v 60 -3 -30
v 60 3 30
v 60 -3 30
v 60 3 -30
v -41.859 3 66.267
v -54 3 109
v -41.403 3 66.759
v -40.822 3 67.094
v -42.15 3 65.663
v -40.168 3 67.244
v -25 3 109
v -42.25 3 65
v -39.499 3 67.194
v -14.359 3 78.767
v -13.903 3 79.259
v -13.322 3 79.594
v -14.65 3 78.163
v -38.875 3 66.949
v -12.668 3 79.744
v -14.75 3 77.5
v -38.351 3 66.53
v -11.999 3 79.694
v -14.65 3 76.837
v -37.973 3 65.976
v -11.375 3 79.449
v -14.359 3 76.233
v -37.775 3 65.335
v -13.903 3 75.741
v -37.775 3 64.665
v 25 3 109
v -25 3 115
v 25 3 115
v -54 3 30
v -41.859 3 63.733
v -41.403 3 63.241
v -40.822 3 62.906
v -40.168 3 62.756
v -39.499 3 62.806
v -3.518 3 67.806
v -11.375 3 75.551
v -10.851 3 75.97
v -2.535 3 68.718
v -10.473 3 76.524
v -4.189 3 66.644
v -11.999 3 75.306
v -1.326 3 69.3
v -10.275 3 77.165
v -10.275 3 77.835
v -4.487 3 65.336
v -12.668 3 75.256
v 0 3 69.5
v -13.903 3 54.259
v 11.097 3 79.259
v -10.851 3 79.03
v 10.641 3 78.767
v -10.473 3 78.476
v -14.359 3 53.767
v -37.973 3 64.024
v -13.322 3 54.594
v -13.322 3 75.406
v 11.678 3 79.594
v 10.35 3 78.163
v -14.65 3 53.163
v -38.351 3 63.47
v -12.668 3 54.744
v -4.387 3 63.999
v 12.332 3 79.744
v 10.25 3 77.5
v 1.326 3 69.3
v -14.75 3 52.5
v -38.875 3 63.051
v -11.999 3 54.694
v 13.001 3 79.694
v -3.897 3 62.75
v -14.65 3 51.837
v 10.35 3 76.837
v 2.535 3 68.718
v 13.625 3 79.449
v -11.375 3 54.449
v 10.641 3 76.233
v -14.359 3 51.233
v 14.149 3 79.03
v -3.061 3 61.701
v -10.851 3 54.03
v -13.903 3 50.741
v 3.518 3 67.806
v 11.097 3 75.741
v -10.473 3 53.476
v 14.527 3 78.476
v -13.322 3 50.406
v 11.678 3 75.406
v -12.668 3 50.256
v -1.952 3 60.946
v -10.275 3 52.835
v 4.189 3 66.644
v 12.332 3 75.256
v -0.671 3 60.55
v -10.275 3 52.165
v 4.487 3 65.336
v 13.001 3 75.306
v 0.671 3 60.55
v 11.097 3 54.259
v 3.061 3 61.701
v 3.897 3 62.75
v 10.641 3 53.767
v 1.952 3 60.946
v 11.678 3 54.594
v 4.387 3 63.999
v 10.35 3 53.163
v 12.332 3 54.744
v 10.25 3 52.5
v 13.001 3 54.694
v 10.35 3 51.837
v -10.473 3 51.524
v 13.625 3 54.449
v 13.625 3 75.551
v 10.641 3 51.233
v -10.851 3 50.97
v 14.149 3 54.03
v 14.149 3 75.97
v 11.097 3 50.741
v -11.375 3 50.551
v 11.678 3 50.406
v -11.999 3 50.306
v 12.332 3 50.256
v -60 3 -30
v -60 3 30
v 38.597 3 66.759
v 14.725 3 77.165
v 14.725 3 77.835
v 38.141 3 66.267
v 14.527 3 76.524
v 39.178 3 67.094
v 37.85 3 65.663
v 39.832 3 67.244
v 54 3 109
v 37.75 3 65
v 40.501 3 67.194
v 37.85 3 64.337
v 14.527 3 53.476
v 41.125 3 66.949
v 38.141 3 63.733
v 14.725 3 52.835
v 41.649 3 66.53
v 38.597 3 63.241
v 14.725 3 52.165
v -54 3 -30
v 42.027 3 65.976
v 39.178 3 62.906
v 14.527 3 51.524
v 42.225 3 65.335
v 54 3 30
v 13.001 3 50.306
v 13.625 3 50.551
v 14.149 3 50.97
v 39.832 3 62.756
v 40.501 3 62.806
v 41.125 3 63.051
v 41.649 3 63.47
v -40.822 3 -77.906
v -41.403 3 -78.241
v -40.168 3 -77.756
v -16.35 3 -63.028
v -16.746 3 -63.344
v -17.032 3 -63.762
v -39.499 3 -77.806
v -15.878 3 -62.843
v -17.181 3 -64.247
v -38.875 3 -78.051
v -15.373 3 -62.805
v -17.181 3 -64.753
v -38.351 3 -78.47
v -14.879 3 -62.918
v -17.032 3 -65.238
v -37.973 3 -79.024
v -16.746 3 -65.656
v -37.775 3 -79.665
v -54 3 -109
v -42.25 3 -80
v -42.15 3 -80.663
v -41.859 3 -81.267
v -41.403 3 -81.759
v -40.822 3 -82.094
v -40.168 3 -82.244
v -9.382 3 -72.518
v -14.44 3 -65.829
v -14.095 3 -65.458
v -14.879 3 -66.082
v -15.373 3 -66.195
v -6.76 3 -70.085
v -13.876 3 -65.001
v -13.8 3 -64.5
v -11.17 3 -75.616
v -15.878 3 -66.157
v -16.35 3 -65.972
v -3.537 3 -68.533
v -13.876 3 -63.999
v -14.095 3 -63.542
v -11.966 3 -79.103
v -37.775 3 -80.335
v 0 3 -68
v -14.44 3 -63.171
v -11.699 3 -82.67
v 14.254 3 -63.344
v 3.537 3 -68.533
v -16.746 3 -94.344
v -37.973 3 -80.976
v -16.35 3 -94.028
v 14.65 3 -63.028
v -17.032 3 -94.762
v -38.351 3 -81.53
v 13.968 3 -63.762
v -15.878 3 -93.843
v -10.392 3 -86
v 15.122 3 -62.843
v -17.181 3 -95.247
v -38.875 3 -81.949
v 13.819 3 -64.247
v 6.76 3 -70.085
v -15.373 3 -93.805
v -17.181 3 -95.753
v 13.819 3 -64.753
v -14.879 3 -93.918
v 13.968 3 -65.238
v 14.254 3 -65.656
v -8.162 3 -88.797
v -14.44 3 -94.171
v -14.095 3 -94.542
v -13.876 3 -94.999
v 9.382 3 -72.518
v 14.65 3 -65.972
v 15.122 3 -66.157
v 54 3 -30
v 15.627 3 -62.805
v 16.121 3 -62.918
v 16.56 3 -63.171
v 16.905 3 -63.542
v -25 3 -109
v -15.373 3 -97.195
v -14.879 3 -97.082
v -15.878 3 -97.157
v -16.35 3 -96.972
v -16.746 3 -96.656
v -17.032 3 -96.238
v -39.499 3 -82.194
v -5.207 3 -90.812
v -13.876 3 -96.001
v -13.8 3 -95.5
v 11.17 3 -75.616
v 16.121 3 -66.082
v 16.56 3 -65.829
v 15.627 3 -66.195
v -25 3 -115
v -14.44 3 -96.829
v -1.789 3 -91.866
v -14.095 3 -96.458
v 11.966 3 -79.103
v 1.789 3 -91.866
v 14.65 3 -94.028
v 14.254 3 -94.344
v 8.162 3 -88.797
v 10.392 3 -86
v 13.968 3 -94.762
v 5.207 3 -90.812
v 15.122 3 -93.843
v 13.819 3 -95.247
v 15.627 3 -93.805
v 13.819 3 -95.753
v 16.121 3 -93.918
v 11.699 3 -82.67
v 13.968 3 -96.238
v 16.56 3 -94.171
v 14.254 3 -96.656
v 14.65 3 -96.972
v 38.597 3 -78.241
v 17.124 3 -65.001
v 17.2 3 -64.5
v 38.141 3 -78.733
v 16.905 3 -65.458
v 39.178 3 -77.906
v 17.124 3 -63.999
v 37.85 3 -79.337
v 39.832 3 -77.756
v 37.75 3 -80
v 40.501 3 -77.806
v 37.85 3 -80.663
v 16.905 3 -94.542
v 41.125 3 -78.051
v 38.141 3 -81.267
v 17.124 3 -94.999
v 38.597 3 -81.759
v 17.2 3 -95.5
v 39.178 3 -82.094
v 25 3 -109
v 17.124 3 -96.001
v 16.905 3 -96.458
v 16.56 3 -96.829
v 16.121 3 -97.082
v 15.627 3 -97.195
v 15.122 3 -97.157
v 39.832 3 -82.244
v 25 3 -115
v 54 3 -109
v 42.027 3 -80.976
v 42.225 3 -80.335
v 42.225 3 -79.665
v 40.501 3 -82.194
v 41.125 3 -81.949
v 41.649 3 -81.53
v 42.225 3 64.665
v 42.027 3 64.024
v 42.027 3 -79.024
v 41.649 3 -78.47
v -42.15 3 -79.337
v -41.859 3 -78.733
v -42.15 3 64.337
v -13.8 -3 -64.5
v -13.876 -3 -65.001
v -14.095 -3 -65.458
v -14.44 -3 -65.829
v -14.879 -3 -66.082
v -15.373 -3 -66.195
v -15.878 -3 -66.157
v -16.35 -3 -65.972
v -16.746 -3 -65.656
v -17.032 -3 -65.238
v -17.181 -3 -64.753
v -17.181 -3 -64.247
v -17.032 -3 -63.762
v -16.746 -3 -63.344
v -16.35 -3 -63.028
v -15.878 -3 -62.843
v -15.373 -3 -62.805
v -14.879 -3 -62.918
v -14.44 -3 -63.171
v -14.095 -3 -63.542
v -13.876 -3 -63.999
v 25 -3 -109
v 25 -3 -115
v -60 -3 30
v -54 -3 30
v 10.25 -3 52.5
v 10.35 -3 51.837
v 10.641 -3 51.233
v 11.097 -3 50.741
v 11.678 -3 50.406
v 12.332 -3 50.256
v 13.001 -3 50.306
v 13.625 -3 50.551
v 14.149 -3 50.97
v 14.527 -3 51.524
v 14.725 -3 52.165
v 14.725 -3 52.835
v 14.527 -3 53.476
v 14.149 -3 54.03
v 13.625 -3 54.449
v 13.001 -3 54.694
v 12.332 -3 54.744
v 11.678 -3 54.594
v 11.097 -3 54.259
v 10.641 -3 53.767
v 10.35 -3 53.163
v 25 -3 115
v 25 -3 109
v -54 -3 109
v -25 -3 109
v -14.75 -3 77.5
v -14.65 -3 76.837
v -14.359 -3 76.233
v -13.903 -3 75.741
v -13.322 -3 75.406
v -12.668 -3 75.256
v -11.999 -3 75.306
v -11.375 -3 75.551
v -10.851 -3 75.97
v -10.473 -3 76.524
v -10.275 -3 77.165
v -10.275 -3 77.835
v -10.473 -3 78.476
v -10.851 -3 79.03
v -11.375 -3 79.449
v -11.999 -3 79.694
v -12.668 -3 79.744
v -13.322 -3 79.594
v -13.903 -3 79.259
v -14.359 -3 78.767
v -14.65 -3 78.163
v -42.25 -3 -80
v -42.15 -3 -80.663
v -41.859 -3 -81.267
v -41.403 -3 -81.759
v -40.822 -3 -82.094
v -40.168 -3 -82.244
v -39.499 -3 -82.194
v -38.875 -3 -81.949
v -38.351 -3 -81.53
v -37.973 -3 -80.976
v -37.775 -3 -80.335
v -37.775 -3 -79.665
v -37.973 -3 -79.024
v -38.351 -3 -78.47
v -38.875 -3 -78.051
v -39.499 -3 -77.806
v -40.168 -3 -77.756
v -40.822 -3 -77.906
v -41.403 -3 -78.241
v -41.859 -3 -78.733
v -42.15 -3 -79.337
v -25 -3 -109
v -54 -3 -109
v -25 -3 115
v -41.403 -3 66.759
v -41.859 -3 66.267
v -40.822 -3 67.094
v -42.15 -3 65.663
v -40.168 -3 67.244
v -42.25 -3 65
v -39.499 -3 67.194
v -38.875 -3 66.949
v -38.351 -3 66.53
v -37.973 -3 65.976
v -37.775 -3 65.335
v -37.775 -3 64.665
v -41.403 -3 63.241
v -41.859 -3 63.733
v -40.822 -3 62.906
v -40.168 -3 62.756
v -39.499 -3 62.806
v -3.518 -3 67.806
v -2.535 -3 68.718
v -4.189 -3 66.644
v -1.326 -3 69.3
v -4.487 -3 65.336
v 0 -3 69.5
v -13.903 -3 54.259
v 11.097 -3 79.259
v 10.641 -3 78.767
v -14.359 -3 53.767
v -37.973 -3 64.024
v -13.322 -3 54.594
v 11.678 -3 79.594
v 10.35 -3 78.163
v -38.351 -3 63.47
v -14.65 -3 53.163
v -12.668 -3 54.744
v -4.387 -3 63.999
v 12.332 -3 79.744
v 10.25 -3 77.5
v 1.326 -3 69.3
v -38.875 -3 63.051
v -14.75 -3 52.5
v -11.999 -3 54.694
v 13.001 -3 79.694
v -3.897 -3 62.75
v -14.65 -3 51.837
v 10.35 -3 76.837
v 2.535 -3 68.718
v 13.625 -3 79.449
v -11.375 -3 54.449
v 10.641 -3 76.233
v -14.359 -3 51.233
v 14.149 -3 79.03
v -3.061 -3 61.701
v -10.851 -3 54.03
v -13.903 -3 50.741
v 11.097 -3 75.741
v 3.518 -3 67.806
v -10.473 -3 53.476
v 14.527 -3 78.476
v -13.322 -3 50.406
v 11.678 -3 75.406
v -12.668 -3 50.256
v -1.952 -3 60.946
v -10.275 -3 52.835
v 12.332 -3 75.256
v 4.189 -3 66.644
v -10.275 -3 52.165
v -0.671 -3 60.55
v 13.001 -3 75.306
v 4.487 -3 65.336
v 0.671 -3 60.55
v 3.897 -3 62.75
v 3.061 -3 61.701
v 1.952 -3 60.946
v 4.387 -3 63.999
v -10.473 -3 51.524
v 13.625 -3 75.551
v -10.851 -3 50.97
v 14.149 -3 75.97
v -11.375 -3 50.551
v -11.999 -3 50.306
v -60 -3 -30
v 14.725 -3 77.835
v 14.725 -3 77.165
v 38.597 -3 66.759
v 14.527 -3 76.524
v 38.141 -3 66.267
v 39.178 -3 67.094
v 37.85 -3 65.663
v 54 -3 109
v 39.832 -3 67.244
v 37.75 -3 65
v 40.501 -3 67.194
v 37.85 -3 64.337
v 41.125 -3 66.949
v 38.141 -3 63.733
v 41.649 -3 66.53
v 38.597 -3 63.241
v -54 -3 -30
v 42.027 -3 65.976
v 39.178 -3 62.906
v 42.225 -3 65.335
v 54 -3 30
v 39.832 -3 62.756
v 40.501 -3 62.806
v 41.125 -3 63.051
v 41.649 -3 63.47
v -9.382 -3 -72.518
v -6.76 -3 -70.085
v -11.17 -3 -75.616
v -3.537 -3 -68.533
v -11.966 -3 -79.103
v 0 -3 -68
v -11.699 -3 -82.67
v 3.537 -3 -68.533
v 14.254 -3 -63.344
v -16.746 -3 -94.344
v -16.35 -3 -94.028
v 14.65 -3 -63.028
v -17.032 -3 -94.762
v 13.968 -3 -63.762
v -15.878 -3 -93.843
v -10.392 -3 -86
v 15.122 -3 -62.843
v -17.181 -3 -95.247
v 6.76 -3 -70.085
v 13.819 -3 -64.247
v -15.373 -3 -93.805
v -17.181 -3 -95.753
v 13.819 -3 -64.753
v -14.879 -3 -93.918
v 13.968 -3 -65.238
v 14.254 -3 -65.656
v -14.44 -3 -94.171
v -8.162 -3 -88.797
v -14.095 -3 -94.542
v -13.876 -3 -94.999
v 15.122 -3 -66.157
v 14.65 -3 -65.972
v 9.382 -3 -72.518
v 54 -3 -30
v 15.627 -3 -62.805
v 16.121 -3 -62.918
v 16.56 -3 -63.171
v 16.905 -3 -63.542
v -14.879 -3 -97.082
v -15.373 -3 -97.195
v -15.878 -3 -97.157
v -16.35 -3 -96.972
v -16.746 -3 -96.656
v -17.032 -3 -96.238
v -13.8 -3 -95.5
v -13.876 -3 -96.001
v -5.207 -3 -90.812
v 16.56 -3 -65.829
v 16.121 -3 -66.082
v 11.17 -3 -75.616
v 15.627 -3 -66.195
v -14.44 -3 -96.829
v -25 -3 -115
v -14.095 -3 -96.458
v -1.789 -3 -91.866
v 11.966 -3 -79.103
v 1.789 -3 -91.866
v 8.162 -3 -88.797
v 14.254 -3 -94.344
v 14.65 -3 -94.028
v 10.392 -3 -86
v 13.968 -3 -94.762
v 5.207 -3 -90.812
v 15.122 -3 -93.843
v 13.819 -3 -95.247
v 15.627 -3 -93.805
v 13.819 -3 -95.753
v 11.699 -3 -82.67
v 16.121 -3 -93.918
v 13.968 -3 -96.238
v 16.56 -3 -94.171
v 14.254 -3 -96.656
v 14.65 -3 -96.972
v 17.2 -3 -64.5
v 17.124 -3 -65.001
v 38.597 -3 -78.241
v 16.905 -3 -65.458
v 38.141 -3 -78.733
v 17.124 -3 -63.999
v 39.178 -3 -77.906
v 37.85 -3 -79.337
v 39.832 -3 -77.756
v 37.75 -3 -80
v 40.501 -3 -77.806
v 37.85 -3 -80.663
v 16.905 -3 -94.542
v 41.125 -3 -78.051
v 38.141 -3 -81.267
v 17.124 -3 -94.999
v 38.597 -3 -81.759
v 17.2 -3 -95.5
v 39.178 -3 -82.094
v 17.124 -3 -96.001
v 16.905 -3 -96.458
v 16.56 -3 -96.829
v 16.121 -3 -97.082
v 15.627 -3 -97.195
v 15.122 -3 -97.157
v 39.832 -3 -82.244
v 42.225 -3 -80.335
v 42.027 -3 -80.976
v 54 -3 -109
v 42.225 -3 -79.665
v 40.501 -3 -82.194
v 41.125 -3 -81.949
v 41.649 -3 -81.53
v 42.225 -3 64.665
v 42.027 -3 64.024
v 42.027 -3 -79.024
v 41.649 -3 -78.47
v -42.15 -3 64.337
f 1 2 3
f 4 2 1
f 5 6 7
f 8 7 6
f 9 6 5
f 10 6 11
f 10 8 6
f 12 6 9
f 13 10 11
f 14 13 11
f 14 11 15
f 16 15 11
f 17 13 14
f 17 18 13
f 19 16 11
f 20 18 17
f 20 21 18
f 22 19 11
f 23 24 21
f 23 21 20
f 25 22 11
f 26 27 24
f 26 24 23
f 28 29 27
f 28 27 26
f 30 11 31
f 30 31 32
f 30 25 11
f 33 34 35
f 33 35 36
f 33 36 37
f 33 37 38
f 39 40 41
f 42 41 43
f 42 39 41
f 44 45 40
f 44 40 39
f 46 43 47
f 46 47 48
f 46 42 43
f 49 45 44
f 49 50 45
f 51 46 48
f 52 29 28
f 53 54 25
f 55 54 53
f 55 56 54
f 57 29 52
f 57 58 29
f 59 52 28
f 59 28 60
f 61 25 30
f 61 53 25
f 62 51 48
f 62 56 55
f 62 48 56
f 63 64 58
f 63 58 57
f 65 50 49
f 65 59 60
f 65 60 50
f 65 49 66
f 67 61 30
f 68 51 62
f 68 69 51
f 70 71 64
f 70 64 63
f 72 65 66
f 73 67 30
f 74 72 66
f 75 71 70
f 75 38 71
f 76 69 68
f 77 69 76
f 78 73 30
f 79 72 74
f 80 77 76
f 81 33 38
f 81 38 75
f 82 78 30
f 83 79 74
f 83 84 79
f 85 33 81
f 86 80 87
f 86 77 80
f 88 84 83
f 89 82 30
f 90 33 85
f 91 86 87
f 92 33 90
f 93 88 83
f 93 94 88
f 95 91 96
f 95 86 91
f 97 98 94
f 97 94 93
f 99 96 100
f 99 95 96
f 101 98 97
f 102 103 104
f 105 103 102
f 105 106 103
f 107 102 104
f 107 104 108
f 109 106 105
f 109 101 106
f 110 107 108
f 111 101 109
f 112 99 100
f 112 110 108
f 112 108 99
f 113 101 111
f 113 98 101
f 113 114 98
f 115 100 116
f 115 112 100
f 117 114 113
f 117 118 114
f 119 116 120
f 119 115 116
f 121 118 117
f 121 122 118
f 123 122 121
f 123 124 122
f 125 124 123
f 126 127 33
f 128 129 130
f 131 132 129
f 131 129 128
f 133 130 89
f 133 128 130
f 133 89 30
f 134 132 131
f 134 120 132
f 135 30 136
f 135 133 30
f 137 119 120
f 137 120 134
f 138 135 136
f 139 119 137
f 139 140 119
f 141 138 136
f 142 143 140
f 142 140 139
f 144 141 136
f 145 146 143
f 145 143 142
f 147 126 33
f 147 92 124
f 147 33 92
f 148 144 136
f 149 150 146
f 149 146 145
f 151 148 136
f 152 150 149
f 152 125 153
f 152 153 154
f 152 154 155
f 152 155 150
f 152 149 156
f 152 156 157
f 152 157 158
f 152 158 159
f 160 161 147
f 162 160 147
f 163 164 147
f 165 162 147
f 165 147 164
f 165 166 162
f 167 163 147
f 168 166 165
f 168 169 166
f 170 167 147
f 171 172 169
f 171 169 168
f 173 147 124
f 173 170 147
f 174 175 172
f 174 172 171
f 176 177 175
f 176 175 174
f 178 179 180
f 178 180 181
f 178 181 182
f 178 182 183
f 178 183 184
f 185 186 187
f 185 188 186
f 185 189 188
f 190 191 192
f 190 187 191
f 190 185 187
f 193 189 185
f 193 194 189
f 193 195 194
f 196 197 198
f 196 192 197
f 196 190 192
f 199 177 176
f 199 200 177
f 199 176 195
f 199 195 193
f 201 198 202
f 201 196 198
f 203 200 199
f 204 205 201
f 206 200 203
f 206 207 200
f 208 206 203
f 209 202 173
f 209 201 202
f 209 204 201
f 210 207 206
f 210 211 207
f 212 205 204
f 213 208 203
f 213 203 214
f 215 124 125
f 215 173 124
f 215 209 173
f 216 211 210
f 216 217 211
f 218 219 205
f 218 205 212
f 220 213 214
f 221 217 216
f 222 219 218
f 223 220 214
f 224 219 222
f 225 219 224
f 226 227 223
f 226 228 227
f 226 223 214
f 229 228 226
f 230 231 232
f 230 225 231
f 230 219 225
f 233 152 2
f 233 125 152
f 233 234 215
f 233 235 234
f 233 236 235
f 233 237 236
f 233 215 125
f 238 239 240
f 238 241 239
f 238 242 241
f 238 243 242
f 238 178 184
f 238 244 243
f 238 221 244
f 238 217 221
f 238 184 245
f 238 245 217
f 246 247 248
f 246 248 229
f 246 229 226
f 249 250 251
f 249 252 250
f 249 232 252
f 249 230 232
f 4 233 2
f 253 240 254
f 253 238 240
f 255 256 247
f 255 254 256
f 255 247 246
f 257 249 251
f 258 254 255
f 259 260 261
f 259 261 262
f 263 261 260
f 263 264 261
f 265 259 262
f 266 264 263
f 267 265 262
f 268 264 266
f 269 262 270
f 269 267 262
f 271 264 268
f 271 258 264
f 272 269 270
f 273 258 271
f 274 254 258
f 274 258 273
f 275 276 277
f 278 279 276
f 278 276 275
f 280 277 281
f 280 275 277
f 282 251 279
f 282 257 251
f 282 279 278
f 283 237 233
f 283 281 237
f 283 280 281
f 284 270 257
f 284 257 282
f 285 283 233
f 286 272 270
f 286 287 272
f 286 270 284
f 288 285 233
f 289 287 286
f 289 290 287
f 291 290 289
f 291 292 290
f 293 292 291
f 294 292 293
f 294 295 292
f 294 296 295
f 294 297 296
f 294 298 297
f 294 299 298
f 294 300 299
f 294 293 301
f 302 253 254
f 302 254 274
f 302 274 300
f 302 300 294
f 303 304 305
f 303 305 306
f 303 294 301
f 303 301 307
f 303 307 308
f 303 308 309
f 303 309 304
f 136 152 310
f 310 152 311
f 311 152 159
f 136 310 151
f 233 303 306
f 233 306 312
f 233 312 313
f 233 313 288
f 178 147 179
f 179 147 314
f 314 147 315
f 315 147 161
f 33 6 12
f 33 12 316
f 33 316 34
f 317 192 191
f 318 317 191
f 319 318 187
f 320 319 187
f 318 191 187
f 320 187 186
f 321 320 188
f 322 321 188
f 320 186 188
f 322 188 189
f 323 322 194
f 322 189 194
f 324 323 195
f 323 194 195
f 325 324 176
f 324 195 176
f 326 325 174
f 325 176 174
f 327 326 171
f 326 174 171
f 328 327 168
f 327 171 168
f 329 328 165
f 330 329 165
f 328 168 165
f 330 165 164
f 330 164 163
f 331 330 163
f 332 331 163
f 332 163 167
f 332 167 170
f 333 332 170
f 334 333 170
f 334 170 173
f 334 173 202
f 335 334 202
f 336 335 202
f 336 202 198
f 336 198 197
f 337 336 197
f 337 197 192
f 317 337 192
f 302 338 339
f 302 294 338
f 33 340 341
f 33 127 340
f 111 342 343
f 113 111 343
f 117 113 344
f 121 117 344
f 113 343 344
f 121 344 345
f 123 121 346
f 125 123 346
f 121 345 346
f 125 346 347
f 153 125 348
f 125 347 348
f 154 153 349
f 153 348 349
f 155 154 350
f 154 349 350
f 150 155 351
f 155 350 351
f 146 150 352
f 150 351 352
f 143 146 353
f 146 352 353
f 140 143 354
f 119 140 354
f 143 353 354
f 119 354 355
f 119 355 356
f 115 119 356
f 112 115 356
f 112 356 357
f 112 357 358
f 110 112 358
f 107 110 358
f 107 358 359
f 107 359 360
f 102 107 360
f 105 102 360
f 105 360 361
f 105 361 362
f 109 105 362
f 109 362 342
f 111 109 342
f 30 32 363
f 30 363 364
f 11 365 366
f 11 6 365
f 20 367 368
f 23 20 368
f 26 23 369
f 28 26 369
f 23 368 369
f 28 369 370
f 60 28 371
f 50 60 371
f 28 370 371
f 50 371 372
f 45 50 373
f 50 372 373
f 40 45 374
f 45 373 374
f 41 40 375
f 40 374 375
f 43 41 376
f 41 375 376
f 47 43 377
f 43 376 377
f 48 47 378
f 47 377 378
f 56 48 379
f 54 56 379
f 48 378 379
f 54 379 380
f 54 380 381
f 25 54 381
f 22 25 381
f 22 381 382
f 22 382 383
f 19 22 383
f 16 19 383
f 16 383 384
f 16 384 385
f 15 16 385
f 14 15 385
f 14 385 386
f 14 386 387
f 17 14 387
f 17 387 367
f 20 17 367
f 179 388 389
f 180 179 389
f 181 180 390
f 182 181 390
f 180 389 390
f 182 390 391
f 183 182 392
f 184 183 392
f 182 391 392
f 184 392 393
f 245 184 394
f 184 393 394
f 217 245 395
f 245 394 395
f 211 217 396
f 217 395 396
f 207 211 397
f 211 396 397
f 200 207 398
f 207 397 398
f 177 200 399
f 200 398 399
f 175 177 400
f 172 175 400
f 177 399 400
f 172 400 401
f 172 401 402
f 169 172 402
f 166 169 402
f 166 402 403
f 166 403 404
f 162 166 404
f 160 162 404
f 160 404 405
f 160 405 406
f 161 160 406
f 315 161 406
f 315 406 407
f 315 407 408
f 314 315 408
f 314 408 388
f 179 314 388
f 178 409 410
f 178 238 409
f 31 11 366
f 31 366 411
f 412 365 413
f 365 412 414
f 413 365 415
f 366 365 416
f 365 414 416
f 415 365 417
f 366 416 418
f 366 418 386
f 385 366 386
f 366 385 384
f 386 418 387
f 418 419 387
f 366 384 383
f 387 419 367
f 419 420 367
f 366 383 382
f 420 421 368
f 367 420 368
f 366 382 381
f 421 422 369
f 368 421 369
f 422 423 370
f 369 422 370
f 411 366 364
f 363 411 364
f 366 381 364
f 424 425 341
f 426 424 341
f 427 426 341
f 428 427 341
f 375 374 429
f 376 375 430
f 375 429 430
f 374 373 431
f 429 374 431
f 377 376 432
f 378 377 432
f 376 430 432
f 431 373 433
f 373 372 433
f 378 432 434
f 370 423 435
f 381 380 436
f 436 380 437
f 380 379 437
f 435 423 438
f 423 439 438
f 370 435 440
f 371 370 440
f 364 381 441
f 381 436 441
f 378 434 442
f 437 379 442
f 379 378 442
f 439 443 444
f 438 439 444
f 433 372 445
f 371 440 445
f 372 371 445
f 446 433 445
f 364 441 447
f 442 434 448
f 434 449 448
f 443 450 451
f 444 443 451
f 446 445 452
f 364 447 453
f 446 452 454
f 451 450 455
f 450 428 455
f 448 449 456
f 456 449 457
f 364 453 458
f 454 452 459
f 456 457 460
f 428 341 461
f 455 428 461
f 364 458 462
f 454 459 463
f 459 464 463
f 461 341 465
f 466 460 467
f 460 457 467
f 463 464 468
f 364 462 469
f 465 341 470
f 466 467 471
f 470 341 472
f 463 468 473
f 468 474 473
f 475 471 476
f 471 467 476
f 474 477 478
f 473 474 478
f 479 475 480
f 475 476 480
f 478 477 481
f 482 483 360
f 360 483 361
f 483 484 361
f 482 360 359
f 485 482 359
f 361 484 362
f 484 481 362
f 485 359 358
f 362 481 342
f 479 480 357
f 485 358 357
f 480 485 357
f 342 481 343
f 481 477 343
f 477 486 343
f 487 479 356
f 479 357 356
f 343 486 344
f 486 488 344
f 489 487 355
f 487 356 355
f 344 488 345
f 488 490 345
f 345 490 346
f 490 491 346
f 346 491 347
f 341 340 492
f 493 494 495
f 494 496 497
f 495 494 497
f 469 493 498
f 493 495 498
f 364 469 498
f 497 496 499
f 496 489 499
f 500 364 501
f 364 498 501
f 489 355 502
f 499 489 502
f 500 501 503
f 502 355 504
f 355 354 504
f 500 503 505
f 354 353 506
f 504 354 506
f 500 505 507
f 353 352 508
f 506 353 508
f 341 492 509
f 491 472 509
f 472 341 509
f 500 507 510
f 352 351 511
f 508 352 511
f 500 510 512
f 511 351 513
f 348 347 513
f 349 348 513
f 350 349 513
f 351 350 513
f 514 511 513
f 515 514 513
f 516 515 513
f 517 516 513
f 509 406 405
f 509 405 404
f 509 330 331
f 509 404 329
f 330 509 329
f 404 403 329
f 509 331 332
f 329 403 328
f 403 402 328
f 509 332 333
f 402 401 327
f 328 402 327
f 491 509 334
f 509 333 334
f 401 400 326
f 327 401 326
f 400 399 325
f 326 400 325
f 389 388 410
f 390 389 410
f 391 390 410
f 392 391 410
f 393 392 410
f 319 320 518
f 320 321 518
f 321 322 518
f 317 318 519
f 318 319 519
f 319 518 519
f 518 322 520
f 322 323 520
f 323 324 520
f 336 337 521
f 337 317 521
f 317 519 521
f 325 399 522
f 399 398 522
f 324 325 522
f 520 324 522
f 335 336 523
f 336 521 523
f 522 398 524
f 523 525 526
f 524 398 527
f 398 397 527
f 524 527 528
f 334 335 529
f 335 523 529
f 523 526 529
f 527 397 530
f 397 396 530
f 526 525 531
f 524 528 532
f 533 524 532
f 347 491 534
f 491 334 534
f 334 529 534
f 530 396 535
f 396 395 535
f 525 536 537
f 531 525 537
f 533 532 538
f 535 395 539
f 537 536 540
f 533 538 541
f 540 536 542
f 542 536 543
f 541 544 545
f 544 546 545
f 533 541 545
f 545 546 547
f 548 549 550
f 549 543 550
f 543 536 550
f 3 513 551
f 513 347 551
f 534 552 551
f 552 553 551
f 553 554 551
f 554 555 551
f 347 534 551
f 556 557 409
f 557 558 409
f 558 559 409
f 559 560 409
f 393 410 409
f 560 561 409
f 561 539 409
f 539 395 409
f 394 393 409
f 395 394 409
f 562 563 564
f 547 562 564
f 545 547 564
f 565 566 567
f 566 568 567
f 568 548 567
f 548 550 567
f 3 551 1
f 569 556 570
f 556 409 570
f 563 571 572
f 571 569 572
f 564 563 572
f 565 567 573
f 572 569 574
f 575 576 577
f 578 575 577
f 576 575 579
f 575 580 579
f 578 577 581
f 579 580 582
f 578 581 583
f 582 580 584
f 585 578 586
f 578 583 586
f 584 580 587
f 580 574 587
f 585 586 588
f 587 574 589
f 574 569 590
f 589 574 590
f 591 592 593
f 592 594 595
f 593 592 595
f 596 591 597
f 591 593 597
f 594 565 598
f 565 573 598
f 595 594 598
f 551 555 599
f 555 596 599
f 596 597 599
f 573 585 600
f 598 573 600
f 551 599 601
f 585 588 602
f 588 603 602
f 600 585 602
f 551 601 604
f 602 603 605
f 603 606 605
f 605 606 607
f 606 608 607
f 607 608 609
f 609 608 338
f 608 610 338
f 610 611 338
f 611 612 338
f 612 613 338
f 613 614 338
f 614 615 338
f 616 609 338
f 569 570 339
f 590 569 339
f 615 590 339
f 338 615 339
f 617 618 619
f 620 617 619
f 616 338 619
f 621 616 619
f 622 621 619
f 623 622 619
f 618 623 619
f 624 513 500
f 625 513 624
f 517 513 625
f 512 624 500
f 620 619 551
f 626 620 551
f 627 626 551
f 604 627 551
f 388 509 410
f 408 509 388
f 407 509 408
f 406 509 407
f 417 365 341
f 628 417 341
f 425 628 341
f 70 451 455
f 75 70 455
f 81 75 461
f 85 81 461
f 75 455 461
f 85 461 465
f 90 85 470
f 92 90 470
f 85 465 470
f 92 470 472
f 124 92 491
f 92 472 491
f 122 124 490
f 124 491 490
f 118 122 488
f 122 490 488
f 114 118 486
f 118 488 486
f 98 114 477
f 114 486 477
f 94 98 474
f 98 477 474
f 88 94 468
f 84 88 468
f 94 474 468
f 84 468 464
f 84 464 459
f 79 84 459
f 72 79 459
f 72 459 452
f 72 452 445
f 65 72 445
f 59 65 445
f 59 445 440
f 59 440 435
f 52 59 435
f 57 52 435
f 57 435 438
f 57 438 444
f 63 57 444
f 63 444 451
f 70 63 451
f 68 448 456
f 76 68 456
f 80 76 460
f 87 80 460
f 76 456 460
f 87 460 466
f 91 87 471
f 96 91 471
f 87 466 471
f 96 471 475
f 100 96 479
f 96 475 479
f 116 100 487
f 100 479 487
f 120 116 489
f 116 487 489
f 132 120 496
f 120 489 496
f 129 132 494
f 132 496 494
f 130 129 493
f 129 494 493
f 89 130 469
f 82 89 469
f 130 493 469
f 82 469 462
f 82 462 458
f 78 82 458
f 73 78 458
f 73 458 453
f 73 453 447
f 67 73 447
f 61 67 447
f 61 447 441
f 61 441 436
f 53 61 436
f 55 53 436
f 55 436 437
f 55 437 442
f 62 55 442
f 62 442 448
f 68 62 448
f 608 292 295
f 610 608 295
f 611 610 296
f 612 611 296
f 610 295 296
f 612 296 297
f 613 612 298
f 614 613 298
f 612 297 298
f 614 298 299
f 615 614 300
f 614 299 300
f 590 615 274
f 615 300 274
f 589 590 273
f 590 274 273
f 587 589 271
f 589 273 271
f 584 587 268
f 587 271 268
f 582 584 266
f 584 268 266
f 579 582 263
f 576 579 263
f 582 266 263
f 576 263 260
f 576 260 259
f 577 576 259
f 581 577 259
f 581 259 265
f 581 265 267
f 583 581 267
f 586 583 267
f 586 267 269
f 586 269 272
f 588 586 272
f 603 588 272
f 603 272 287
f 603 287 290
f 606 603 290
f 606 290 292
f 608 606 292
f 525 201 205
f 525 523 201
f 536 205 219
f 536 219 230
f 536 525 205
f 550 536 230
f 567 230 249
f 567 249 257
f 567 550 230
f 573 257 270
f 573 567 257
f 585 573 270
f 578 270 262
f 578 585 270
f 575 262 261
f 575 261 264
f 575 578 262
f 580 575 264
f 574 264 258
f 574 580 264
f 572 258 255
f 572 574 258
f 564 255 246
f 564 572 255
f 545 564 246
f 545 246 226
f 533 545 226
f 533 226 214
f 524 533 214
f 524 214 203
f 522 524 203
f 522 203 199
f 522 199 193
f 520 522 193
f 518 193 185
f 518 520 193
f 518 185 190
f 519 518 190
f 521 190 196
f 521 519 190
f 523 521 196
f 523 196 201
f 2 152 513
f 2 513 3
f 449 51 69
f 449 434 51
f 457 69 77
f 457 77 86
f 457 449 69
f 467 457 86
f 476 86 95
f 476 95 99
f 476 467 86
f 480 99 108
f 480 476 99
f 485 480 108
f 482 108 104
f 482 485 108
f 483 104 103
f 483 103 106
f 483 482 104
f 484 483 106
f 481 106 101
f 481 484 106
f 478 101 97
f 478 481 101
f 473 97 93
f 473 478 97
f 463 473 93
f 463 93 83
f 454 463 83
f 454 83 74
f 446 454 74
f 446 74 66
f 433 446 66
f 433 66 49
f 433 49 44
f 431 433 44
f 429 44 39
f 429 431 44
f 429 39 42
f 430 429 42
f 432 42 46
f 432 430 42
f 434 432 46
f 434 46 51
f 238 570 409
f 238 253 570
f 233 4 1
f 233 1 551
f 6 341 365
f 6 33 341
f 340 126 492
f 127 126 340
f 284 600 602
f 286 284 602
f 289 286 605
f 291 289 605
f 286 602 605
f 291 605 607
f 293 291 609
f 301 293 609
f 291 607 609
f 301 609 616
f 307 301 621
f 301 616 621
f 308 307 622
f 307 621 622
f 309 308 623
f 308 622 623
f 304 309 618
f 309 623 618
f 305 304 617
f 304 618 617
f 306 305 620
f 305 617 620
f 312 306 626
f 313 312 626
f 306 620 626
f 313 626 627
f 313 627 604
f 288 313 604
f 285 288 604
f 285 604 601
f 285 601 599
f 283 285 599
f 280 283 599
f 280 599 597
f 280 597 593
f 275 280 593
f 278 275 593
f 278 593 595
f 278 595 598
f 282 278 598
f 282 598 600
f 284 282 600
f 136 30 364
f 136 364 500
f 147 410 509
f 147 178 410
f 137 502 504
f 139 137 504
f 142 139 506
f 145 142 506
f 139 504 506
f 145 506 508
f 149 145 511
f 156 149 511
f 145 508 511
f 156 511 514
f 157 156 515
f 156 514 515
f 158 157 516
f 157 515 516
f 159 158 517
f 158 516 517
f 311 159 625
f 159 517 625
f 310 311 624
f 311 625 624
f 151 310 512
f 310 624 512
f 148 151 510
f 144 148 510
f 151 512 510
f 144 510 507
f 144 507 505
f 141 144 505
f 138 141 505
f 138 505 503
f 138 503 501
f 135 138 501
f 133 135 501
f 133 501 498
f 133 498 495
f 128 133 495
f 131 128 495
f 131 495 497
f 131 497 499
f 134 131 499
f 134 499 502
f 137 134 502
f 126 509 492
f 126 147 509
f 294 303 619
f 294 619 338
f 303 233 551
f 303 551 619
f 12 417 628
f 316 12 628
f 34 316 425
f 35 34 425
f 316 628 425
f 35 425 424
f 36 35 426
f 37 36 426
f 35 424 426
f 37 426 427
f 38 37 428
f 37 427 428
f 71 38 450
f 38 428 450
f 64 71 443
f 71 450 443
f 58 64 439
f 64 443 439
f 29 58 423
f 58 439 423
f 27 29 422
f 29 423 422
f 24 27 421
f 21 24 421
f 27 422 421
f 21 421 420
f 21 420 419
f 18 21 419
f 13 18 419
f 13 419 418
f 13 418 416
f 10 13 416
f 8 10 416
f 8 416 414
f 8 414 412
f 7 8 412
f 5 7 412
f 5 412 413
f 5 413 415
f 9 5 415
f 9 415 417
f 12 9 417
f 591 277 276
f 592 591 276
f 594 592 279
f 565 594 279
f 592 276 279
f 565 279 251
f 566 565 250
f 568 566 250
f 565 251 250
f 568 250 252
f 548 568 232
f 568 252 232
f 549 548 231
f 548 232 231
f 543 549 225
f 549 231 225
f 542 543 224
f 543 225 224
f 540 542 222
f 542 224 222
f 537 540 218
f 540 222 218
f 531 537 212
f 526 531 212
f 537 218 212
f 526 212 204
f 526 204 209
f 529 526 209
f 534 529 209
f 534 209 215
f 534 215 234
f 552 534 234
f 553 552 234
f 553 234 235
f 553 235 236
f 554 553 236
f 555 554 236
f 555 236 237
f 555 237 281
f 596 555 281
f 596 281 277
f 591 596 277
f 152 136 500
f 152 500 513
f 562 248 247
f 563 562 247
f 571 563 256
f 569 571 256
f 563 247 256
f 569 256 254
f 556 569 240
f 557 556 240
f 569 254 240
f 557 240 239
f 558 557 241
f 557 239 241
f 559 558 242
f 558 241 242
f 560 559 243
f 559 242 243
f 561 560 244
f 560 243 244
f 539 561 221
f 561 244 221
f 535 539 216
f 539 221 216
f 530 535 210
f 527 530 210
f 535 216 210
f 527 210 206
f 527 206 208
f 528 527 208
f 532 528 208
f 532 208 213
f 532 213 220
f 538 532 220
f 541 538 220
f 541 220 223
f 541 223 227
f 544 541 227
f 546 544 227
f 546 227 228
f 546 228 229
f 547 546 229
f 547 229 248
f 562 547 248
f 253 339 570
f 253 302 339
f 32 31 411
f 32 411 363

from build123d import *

# Parameters (mm, degrees)
CROQUIS1_R                   = 4.5
CROQUIS1_R_2                 = 12
SALIENTE_EXTRUIR1_DEPTH      = 3
TALADRO_DE_MARGEN_PARA_M41_D = 4.5
TALADRO_DE_MARGEN_PARA_M42_D = 4.5
TALADRO_DE_MARGEN_PARA_M32_D = 3.4


with BuildPart() as part:
    # Croquis1 → Saliente-Extruir1 (new, symmetric)
    with BuildSketch(Plane(origin=(0, 0, 0), x_dir=(1, 0, 0), z_dir=(0, 1, 0))):
        Polygon((-54, -109), (-25, -109), (-25, -115), (25, -115), (25, -109), (54, -109), (54, -30), (60, -30), (60, 30), (54, 30), (54, 109), (25, 109), (25, 115), (-25, 115), (-25, 109), (-54, 109), (-54, 30), (-60, 30), (-60, -30), (-54, -30), align=None)
        with Locations(Location((0, -65, 0), (0, 0, 270))):
            Circle(CROQUIS1_R, mode=Mode.SUBTRACT)
        with Locations(Location((0, 80, 0), (0, 0, 270))):
            Circle(CROQUIS1_R_2, mode=Mode.SUBTRACT)
    extrude(amount=SALIENTE_EXTRUIR1_DEPTH, both=True)

    # Taladro de margen para M41 (through all)
    with Locations(Plane(origin=(0, 3, 0), x_dir=(1, 0, 0), z_dir=(0, 1, 0))):
        with Locations((-12.5, -77.5), (-12.5, -52.5), (12.5, -52.5), (12.5, -77.5)):
            Hole(TALADRO_DE_MARGEN_PARA_M41_D / 2)

    # Taladro de margen para M42 (through all)
    with Locations(Plane(origin=(0, 3, 0), x_dir=(1, 0, 0), z_dir=(0, 1, 0))):
        with Locations((-40, 80), (-40, -65), (40, -65), (40, 80)):
            Hole(TALADRO_DE_MARGEN_PARA_M42_D / 2)

    # Taladro de margen para M32 (through all)
    with Locations(Plane(origin=(0, -3, 0), x_dir=(-1, 0, 0), z_dir=(0, -1, 0))):
        with Locations((-15.5, 64.5), (-15.5, 95.5), (15.5, 95.5), (15.5, 64.5)):
            Hole(TALADRO_DE_MARGEN_PARA_M32_D / 2)


solid = part.part
